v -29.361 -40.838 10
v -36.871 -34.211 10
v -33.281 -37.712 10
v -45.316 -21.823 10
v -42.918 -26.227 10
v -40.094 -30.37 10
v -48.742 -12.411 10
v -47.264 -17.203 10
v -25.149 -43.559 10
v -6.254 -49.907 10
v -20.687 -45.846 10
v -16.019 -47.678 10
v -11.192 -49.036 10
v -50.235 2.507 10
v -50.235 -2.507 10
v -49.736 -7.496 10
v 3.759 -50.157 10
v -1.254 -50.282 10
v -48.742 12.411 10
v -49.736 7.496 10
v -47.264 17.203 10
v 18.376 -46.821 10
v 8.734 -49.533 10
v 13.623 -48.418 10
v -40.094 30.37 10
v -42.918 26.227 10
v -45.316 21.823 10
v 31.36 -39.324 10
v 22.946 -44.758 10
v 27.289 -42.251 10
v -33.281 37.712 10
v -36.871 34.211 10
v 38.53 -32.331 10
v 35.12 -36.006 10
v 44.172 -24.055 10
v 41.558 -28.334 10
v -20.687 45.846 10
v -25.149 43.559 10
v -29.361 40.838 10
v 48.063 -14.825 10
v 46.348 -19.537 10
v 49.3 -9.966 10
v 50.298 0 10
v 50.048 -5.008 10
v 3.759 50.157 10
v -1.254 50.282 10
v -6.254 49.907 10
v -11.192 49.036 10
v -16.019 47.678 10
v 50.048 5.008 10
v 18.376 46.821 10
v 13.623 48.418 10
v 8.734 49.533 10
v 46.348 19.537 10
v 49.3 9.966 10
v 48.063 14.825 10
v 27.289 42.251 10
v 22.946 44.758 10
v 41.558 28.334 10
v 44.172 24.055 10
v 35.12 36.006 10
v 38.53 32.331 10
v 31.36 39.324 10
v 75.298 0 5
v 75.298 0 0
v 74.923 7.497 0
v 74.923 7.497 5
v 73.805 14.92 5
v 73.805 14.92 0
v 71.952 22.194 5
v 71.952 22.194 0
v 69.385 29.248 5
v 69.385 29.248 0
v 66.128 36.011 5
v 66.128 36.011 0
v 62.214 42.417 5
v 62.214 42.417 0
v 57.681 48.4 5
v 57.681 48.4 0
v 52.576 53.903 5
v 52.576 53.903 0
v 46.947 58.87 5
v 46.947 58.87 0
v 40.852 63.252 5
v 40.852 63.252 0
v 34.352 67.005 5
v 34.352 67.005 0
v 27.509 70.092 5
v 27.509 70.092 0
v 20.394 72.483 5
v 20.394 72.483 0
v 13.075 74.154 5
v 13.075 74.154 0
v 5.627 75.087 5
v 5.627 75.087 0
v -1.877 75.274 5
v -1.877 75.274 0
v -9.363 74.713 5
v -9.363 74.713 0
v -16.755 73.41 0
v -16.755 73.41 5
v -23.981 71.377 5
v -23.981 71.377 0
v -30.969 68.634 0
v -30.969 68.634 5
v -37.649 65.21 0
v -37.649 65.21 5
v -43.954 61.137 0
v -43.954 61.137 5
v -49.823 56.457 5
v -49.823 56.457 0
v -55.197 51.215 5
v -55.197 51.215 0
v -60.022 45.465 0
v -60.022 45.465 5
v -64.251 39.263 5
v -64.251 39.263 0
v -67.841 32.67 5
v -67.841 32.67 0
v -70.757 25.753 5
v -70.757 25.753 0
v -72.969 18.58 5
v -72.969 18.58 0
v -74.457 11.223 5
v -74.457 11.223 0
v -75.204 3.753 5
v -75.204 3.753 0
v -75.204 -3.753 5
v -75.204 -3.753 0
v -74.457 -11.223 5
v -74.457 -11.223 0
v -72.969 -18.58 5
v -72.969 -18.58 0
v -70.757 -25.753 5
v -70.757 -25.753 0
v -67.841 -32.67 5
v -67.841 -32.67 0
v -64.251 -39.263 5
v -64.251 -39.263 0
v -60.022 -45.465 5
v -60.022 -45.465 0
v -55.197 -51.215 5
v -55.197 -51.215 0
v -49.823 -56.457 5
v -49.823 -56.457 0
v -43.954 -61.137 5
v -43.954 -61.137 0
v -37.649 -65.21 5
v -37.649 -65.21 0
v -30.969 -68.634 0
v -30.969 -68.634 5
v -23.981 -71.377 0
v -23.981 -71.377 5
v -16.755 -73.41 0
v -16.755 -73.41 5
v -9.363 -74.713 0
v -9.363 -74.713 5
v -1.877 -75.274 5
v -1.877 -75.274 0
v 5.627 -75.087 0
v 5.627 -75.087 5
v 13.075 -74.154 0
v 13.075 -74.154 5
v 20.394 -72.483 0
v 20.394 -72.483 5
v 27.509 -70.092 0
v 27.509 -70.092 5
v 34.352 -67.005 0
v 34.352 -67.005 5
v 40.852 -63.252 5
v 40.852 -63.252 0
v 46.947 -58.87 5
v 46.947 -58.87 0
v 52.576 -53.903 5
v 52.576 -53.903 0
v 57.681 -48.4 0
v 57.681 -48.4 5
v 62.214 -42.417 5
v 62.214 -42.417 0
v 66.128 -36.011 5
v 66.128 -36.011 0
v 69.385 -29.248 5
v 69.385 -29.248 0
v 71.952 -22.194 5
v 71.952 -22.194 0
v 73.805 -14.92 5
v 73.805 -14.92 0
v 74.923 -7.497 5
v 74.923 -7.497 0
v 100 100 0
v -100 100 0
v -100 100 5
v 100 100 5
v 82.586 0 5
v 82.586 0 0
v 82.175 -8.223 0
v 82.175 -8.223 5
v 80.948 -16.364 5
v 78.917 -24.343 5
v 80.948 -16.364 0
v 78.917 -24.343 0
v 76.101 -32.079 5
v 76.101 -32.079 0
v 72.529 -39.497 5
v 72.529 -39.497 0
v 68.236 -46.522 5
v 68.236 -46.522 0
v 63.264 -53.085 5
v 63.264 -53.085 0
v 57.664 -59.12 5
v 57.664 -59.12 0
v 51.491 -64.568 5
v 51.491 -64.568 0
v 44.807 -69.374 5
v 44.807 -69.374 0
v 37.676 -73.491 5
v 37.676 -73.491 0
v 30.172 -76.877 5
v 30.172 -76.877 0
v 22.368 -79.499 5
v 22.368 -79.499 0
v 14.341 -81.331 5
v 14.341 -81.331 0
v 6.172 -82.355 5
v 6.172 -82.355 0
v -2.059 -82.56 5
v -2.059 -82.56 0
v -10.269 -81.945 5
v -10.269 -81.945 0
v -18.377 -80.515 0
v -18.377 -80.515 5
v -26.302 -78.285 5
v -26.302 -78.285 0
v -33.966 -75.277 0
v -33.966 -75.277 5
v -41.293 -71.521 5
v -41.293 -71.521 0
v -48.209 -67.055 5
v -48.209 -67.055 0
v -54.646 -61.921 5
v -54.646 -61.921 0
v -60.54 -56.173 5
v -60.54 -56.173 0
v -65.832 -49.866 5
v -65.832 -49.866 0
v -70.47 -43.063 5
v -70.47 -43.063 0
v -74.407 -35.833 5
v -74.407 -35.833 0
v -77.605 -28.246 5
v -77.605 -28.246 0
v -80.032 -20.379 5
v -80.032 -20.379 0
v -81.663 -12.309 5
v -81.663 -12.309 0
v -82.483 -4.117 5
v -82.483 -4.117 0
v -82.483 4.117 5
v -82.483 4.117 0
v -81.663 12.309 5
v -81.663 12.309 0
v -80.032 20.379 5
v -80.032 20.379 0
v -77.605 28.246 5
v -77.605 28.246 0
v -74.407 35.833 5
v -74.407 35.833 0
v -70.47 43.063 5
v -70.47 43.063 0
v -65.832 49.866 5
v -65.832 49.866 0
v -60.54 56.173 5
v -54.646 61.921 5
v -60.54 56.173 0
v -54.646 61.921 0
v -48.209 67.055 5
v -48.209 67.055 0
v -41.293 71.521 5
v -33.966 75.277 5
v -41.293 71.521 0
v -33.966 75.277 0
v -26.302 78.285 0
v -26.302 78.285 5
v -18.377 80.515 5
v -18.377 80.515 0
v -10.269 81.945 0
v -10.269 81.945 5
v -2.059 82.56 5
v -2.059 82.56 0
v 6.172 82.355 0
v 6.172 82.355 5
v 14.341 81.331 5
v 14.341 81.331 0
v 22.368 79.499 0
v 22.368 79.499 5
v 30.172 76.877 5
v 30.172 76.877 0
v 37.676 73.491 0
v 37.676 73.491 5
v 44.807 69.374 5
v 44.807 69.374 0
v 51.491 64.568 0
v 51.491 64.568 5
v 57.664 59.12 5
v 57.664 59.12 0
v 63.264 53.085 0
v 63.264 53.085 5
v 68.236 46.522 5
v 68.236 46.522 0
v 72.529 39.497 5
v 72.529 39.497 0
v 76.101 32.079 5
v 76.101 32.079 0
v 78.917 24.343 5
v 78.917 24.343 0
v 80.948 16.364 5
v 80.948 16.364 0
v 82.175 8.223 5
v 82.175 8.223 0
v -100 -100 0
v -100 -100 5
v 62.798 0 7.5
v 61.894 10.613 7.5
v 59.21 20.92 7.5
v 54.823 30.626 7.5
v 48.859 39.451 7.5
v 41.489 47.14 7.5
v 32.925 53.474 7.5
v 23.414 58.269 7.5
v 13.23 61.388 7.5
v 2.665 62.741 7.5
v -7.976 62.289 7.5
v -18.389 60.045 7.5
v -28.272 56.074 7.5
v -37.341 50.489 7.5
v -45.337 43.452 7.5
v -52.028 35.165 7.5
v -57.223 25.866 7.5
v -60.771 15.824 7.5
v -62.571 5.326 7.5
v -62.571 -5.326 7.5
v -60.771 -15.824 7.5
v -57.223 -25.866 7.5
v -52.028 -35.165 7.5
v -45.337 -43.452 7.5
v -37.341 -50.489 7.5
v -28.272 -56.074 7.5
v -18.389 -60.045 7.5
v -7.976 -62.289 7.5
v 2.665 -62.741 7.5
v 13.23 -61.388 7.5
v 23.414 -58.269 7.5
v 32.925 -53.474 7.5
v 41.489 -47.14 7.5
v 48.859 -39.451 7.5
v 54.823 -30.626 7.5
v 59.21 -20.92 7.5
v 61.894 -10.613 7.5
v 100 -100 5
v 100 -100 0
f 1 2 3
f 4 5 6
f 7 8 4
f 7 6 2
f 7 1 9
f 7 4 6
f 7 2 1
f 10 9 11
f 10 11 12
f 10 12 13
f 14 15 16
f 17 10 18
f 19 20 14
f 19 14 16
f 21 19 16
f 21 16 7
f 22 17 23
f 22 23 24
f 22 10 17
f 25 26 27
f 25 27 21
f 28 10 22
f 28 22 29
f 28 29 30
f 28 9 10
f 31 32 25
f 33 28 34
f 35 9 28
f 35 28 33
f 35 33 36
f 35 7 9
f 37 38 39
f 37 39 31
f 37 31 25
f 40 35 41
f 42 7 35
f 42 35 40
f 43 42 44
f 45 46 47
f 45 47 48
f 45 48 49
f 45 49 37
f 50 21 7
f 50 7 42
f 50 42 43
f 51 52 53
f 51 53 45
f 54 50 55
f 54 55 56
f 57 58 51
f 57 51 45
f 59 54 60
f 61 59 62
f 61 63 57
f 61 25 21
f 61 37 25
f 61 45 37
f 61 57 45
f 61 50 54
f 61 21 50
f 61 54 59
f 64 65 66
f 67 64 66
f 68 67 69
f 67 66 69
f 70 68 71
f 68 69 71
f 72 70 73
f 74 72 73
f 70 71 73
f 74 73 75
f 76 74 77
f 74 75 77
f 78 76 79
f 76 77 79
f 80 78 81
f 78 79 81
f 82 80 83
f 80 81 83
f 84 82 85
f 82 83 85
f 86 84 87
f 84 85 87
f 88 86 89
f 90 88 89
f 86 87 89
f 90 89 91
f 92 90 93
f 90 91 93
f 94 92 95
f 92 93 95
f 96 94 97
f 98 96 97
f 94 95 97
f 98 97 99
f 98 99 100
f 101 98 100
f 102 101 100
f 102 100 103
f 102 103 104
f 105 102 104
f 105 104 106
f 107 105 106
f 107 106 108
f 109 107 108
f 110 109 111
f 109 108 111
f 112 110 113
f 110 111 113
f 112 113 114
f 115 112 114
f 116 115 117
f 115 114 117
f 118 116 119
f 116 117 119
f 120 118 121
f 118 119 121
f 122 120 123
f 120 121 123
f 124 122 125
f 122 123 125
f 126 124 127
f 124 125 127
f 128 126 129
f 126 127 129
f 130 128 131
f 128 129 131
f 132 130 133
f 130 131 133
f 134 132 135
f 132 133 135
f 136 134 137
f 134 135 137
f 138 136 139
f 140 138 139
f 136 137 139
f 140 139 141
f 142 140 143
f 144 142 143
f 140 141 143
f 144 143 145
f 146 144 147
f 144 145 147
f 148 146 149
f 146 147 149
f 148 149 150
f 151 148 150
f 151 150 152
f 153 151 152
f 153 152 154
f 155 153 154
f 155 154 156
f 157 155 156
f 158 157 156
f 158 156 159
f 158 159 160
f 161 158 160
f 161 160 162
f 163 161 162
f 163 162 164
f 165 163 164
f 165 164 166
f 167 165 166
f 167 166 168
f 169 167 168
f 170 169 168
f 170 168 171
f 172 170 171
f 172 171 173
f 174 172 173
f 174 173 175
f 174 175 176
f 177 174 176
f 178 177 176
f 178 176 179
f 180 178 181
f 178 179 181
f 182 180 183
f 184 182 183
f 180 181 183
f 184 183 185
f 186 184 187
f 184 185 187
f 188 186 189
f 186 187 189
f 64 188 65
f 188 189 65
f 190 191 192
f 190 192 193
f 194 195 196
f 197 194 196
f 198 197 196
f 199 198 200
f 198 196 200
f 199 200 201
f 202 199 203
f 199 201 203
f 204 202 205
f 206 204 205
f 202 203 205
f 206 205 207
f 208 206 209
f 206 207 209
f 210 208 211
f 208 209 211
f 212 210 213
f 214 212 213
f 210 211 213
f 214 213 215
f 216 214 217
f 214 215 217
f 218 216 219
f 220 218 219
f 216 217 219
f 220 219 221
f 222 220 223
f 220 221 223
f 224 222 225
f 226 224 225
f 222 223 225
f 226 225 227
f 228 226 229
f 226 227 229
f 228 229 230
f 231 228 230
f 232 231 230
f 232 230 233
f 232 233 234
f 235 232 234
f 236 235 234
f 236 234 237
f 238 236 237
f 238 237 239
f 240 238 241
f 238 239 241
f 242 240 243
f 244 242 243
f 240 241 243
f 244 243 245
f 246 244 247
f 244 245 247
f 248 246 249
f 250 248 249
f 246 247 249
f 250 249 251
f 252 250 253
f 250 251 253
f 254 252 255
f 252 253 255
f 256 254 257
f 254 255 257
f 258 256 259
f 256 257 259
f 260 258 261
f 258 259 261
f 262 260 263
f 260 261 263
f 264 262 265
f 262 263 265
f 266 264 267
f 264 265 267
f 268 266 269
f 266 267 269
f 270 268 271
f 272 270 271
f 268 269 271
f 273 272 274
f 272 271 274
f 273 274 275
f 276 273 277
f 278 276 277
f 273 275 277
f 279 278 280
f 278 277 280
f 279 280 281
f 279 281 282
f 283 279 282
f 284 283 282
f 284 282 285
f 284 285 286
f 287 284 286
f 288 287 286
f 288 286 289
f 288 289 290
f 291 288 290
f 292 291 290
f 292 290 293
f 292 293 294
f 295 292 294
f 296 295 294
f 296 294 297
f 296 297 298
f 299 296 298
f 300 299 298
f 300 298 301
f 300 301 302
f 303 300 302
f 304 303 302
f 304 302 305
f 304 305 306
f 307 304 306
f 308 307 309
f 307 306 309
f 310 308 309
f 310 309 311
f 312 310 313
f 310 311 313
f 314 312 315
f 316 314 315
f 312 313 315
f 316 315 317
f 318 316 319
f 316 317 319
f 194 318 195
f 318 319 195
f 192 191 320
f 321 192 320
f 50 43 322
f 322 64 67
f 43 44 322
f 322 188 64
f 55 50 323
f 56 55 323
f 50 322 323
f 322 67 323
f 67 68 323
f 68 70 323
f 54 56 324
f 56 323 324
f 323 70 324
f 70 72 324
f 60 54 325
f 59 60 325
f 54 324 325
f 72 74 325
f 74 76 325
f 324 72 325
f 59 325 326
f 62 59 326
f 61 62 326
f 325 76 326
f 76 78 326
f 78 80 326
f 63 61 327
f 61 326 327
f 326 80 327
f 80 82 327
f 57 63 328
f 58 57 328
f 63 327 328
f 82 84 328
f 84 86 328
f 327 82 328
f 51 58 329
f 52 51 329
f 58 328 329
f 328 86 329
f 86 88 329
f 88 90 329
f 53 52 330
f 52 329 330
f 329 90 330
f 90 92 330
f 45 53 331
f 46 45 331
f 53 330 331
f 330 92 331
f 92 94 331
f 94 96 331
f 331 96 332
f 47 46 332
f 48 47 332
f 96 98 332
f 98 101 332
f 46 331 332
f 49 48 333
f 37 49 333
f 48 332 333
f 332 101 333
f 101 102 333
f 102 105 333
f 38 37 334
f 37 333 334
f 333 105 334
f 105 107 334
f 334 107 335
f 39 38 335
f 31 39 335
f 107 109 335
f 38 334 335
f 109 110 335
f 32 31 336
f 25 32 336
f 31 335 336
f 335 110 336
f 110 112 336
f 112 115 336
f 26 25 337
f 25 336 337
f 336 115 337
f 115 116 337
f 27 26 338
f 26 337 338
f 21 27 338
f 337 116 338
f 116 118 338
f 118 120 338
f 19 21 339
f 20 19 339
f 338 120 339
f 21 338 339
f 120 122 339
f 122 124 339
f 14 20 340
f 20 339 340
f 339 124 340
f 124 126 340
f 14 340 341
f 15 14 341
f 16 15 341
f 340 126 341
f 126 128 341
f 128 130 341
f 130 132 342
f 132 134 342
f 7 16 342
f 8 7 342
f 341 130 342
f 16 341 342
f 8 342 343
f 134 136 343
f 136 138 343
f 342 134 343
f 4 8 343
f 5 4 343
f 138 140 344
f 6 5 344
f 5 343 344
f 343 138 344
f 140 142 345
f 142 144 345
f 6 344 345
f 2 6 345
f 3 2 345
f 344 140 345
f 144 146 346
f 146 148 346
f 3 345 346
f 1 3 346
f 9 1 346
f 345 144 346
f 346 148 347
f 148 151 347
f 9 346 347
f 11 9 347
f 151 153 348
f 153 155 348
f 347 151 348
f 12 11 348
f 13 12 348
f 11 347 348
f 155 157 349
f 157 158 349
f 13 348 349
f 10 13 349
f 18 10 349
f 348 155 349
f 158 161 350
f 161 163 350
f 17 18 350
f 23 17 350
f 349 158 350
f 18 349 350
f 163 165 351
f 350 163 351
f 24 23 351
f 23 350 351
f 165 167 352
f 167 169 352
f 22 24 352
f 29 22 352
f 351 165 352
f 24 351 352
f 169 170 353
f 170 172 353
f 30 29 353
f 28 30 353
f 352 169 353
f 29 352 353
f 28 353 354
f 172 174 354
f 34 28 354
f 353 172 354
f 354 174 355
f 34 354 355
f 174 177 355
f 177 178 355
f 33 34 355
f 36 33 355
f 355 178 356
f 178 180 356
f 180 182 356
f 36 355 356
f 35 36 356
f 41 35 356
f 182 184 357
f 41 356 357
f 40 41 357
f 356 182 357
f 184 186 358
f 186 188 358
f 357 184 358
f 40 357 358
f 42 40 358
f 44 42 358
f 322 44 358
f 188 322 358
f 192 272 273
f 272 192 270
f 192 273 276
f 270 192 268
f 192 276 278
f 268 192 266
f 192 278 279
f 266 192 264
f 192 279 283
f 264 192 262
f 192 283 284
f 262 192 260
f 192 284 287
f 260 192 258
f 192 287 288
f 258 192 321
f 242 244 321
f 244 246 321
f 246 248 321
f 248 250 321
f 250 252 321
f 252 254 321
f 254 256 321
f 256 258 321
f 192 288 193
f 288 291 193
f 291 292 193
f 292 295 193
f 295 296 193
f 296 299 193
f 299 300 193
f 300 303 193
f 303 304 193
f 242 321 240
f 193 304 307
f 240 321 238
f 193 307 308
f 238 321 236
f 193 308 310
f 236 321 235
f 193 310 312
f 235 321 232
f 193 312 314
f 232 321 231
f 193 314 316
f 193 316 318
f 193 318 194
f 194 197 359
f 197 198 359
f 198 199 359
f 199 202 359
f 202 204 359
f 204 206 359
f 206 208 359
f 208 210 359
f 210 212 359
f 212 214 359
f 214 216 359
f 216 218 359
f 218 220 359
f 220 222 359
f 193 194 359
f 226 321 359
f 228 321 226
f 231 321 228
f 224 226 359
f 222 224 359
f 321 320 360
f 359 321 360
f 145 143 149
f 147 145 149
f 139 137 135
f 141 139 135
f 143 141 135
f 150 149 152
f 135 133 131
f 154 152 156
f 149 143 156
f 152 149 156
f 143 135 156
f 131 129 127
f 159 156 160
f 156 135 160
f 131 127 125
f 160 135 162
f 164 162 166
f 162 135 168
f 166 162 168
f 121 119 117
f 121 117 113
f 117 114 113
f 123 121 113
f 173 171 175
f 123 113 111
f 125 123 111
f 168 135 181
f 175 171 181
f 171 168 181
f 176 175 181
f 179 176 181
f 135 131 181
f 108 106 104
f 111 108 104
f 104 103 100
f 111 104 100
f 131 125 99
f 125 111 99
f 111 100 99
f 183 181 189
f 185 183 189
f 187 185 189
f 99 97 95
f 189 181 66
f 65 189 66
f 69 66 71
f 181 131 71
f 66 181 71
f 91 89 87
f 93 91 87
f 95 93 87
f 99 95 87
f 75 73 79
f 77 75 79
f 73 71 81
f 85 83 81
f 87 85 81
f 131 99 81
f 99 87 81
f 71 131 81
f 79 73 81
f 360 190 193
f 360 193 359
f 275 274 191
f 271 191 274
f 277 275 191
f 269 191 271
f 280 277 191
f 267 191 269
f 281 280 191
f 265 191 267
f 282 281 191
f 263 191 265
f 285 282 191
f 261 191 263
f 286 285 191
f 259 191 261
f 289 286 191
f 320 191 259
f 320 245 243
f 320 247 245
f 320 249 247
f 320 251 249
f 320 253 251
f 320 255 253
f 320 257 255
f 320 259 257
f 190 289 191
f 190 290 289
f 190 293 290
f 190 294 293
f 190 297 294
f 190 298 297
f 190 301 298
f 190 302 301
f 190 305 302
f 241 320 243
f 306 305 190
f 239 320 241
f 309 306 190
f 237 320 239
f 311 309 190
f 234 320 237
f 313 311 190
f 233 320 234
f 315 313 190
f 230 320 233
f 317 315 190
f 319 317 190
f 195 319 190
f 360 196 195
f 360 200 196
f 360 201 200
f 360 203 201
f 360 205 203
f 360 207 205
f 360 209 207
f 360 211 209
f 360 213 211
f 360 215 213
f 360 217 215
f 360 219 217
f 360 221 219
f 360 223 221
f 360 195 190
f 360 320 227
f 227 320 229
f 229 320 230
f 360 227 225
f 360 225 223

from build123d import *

# Parameters (mm, degrees)
F0_R     = 75.2975201883
F1_DEPTH = 10
F2_SIZE2 = 5
F2_SIZE  = 25
F3_W     = 200
F3_H     = 200
F3_R     = 82.5857424783
F4_DEPTH = 5


with BuildPart() as f1:
    # F0 (on Top) → F1 (new body)
    with BuildSketch(Plane.XY):
        Circle(F0_R)
    extrude(amount=F1_DEPTH)

    # F2
    f2_edges = [f1.edges().sort_by_distance(p)[0] for p in [
        (-75.29752, 0, 10),
    ]]
    f2_side = f1.faces().sort_by_distance((0, 0, 10))[0]
    chamfer(f2_edges, length=F2_SIZE, length2=F2_SIZE2, reference=f2_side)


with BuildPart() as f4:
    # F3 (on face) → F4 (new body)
    with BuildSketch(Plane(origin=(0, 0, 0), x_dir=(1, 0, 0), z_dir=(0, 0, -1))):
        Rectangle(F3_W, F3_H)
        Circle(F3_R, mode=Mode.SUBTRACT)
    extrude(amount=-F4_DEPTH)


solid = Compound([f1.part, f4.part])
